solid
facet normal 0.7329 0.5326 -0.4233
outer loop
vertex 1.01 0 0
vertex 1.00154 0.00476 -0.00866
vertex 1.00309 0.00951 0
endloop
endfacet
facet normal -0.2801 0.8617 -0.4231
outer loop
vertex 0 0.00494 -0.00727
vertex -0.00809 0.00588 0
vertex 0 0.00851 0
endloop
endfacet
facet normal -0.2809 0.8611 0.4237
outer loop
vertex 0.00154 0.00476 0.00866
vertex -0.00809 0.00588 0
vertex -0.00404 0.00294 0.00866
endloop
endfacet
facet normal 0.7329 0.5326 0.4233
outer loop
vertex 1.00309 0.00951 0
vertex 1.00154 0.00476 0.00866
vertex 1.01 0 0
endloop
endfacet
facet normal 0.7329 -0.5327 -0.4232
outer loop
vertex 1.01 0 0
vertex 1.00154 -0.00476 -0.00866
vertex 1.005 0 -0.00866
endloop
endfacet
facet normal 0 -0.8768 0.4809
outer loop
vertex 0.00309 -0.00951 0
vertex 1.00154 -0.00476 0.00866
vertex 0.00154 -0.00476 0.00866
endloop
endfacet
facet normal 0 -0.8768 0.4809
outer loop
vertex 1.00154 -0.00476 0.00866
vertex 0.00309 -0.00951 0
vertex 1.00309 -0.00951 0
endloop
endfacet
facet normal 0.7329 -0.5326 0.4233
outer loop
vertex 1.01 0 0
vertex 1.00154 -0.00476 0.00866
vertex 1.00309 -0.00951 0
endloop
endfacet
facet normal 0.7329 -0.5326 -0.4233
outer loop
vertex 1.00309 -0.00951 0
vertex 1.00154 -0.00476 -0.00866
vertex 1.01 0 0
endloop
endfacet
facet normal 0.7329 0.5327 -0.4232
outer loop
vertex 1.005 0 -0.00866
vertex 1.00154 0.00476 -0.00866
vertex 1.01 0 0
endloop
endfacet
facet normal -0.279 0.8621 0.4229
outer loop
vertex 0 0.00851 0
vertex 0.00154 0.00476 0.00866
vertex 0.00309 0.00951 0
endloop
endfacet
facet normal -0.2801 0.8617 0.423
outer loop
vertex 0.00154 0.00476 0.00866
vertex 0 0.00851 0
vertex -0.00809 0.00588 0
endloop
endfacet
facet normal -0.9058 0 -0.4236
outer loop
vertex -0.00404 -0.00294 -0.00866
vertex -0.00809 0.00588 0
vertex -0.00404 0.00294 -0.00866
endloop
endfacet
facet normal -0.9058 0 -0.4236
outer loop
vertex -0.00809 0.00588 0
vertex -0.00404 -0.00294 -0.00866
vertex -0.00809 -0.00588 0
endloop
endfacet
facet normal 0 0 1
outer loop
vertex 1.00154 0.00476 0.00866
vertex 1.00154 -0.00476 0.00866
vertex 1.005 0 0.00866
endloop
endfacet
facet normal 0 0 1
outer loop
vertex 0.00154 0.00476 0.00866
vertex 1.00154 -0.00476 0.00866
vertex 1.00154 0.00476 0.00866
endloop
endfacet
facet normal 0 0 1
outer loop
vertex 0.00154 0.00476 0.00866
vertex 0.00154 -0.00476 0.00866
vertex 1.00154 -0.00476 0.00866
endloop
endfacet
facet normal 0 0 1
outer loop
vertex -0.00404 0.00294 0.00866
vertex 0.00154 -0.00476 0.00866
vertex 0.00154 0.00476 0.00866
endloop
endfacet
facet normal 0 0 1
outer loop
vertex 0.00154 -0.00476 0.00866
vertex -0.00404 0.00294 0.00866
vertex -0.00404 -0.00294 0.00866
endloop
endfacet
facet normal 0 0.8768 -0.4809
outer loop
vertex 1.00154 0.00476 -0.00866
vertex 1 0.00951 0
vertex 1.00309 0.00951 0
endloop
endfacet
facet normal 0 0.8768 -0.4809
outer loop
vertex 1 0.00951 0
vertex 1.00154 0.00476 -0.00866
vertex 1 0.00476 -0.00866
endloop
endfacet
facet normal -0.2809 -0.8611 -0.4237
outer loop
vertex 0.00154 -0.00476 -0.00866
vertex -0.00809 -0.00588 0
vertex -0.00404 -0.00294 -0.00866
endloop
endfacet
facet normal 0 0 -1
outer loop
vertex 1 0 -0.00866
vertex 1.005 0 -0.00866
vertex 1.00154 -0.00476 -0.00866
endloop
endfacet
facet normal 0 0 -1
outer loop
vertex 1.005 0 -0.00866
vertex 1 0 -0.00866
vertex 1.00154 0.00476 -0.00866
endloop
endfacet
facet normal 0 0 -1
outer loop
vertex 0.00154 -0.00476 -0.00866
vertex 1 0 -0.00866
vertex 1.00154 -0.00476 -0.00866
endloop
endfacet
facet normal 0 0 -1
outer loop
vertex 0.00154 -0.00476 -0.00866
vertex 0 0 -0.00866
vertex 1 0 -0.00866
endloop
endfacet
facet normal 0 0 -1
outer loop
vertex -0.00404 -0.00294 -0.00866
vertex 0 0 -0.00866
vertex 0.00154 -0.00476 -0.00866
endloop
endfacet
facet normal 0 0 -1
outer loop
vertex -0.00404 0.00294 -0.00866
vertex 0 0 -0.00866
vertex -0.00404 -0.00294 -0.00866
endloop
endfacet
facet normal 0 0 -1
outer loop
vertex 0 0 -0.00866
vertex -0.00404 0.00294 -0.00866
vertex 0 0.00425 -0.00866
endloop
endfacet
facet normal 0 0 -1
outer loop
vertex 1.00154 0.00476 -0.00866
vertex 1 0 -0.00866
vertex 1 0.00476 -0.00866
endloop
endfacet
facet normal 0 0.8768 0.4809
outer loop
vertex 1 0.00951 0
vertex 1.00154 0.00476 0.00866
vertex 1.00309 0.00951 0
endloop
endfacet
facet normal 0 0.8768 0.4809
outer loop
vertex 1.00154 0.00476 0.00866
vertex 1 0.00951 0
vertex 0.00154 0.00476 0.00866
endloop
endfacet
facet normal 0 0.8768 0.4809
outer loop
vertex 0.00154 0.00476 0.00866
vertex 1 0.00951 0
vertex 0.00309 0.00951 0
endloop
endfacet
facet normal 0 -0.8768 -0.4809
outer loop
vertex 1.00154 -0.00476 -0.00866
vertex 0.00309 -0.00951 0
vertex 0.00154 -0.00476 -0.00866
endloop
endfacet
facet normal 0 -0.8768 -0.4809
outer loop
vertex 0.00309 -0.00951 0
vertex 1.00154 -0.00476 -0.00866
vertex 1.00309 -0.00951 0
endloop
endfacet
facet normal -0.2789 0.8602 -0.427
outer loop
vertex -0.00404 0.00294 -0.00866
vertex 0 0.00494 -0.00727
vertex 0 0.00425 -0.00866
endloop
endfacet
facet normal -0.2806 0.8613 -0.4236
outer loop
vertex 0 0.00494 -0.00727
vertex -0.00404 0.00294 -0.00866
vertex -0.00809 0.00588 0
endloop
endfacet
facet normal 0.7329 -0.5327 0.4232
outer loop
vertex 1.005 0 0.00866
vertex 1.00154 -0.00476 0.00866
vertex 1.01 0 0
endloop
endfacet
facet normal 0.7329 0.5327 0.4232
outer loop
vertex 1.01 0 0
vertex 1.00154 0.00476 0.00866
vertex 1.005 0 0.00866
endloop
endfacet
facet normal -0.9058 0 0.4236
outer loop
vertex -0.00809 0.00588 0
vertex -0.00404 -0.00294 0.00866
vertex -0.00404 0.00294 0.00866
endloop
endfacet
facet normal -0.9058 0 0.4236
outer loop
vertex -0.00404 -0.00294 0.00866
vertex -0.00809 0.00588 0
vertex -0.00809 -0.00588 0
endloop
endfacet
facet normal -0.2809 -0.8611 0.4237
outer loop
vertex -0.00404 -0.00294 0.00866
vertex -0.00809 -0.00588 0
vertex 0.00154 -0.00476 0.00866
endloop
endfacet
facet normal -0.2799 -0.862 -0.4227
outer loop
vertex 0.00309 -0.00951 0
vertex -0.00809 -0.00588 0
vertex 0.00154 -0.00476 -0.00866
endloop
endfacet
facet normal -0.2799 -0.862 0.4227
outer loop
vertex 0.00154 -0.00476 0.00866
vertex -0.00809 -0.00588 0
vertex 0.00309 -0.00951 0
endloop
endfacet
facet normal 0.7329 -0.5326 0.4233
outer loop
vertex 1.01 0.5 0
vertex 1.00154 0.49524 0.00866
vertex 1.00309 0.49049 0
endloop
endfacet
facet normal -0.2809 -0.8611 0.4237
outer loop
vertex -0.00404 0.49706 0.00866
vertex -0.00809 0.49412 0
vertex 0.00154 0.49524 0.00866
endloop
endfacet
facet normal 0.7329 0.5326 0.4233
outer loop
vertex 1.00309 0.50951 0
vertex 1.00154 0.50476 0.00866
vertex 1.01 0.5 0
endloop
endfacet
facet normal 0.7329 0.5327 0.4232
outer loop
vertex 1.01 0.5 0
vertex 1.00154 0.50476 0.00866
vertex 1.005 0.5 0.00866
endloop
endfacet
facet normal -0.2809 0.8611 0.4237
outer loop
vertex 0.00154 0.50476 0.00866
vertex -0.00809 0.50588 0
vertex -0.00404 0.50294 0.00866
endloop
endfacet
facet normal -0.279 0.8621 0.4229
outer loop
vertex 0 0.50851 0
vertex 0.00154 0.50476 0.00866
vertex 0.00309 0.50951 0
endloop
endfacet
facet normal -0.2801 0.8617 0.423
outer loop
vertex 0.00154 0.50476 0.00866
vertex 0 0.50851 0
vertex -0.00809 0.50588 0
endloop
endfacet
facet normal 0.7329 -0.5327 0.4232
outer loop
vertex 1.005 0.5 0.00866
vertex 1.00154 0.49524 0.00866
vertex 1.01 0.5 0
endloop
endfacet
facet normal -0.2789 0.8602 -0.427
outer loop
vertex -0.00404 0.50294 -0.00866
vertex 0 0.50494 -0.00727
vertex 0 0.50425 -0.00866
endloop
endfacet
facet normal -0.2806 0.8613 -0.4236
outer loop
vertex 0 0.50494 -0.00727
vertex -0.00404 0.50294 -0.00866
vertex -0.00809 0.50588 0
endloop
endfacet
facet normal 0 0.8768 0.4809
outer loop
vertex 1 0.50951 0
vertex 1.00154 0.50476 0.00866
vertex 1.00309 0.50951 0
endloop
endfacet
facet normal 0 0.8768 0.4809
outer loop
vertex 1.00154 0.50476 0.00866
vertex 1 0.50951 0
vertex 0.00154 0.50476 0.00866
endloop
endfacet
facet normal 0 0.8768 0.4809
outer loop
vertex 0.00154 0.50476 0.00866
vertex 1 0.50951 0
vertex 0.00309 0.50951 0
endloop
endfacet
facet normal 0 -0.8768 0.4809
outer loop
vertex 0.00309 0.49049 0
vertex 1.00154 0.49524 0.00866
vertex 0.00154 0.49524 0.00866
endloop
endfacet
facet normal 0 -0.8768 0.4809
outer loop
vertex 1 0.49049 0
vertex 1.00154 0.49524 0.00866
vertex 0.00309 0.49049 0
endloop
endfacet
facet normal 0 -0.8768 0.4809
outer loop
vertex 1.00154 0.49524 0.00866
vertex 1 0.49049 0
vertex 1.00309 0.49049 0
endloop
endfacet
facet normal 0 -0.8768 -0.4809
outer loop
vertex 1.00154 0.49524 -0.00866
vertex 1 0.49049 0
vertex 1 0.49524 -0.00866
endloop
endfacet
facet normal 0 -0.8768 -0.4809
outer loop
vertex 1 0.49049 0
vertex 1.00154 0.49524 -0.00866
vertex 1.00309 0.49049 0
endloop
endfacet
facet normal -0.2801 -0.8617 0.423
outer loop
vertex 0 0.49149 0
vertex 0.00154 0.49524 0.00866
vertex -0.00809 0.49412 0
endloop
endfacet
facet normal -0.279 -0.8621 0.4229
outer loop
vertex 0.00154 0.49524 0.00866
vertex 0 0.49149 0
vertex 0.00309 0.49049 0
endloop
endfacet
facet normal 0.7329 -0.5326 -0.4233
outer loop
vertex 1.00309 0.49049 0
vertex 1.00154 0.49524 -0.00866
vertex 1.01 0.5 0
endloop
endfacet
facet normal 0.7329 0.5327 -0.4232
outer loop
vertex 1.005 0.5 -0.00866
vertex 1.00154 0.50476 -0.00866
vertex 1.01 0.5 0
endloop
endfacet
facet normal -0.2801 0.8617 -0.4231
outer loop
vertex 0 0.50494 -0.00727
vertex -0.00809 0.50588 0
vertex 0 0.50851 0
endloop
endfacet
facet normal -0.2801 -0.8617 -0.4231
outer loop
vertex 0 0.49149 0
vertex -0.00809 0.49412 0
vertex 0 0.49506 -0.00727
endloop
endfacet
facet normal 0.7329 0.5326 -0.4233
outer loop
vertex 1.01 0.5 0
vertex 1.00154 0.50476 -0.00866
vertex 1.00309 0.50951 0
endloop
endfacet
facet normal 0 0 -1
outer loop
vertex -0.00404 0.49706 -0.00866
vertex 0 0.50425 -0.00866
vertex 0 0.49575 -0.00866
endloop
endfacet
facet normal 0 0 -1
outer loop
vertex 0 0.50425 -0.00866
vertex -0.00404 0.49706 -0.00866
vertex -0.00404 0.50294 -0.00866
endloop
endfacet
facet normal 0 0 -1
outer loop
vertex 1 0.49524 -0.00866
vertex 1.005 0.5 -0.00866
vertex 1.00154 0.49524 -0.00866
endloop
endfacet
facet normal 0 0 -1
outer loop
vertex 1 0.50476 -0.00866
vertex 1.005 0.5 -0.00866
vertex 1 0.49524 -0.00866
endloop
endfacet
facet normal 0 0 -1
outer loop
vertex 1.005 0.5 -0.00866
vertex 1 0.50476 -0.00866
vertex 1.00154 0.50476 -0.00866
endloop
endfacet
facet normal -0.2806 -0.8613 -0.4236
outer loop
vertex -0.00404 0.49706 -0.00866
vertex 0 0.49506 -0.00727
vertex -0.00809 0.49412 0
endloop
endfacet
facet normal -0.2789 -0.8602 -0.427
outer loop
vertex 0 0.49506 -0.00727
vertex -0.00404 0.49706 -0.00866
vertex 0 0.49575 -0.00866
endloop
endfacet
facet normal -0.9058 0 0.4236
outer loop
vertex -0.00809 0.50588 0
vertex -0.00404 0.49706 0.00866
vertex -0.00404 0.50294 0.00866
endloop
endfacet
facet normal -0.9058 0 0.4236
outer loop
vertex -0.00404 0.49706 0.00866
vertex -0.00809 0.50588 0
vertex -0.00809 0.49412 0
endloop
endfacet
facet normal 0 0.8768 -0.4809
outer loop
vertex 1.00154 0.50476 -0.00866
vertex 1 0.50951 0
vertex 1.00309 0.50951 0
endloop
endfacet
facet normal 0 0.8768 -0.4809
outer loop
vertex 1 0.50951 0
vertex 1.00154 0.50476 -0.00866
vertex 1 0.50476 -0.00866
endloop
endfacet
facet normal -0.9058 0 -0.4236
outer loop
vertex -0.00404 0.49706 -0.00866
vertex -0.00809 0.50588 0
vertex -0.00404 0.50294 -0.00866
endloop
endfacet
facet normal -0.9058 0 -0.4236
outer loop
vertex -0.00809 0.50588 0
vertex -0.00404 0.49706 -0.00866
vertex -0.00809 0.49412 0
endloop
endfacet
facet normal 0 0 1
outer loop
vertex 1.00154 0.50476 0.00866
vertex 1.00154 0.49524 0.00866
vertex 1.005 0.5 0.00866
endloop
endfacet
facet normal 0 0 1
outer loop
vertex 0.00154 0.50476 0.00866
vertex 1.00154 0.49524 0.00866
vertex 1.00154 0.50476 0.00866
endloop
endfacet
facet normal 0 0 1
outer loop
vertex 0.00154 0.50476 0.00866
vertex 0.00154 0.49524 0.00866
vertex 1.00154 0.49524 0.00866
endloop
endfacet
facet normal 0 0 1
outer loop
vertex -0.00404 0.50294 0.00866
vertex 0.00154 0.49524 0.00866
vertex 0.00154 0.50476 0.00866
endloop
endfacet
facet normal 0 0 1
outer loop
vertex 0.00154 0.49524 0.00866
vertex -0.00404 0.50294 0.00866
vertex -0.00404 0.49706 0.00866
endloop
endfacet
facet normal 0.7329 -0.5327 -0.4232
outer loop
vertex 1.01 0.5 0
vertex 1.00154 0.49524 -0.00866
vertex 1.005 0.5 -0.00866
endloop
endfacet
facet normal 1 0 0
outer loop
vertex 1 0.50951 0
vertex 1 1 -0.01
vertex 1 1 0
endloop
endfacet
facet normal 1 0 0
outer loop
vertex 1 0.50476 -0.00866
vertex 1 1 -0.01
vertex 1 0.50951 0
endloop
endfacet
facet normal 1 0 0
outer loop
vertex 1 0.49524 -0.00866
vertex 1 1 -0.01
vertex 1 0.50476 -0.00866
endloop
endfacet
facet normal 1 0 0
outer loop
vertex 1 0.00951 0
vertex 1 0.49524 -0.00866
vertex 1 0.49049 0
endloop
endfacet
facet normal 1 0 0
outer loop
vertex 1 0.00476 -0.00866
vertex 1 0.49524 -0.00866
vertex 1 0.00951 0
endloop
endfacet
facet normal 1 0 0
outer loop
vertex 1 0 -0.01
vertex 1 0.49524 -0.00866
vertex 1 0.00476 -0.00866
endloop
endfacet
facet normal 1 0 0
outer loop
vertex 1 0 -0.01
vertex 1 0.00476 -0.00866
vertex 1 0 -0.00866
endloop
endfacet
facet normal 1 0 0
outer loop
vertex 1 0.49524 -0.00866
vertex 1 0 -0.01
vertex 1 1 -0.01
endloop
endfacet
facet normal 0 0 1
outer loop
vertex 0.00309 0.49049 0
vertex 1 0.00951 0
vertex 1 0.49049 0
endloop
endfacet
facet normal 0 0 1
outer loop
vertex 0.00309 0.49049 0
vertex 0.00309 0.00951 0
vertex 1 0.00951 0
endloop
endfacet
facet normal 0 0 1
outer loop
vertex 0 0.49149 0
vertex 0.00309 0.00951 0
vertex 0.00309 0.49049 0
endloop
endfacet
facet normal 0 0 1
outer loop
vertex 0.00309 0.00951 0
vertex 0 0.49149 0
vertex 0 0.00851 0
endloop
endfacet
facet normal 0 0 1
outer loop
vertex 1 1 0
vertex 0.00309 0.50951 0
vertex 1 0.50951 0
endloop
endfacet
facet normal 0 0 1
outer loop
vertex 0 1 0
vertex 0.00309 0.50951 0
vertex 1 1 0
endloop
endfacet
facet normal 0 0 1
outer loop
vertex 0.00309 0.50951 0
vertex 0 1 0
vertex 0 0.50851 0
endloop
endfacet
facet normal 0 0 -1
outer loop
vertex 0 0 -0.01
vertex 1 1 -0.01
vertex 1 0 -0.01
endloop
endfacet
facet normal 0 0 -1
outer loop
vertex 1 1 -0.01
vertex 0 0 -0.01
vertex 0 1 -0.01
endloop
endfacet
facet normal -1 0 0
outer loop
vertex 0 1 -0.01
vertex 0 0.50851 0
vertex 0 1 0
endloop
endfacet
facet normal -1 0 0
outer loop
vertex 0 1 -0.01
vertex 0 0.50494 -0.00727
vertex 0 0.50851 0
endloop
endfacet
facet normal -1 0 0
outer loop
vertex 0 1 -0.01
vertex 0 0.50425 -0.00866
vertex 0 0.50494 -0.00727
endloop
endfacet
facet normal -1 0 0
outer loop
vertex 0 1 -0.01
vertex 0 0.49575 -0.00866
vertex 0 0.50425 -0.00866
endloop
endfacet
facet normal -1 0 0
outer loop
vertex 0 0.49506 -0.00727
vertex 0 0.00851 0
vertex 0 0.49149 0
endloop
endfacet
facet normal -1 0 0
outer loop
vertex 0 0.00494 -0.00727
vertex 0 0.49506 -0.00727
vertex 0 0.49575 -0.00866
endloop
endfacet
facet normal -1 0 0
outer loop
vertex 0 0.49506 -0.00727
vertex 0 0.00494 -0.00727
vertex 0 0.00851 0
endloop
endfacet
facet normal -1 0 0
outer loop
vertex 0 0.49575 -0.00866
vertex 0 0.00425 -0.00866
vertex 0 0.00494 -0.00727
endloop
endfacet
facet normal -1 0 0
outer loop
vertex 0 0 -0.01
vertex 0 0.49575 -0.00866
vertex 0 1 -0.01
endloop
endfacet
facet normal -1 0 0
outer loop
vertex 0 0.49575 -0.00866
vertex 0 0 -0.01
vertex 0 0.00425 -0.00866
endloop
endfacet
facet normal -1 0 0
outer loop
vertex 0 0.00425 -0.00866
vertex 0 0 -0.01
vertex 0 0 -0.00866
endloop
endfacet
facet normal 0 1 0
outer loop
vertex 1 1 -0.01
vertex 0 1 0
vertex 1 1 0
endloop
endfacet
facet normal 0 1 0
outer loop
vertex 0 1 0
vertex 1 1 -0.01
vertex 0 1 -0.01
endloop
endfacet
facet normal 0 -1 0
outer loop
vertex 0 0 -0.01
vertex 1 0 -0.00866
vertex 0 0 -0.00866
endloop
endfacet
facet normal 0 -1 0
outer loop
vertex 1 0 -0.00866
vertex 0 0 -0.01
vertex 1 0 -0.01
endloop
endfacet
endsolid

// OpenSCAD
hull(){
    translate([0.0, 0.0]) sphere(0.01);
    translate([1.0, 0.0]) sphere(0.01);
}
hull(){
    translate([1.0, 0.5]) sphere(0.01);
    translate([0.0, 0.5]) sphere(0.01);
}
translate([0,0,-0.01]) color([0.1,0.1,0.1]) cube([1,1,0.01]);
